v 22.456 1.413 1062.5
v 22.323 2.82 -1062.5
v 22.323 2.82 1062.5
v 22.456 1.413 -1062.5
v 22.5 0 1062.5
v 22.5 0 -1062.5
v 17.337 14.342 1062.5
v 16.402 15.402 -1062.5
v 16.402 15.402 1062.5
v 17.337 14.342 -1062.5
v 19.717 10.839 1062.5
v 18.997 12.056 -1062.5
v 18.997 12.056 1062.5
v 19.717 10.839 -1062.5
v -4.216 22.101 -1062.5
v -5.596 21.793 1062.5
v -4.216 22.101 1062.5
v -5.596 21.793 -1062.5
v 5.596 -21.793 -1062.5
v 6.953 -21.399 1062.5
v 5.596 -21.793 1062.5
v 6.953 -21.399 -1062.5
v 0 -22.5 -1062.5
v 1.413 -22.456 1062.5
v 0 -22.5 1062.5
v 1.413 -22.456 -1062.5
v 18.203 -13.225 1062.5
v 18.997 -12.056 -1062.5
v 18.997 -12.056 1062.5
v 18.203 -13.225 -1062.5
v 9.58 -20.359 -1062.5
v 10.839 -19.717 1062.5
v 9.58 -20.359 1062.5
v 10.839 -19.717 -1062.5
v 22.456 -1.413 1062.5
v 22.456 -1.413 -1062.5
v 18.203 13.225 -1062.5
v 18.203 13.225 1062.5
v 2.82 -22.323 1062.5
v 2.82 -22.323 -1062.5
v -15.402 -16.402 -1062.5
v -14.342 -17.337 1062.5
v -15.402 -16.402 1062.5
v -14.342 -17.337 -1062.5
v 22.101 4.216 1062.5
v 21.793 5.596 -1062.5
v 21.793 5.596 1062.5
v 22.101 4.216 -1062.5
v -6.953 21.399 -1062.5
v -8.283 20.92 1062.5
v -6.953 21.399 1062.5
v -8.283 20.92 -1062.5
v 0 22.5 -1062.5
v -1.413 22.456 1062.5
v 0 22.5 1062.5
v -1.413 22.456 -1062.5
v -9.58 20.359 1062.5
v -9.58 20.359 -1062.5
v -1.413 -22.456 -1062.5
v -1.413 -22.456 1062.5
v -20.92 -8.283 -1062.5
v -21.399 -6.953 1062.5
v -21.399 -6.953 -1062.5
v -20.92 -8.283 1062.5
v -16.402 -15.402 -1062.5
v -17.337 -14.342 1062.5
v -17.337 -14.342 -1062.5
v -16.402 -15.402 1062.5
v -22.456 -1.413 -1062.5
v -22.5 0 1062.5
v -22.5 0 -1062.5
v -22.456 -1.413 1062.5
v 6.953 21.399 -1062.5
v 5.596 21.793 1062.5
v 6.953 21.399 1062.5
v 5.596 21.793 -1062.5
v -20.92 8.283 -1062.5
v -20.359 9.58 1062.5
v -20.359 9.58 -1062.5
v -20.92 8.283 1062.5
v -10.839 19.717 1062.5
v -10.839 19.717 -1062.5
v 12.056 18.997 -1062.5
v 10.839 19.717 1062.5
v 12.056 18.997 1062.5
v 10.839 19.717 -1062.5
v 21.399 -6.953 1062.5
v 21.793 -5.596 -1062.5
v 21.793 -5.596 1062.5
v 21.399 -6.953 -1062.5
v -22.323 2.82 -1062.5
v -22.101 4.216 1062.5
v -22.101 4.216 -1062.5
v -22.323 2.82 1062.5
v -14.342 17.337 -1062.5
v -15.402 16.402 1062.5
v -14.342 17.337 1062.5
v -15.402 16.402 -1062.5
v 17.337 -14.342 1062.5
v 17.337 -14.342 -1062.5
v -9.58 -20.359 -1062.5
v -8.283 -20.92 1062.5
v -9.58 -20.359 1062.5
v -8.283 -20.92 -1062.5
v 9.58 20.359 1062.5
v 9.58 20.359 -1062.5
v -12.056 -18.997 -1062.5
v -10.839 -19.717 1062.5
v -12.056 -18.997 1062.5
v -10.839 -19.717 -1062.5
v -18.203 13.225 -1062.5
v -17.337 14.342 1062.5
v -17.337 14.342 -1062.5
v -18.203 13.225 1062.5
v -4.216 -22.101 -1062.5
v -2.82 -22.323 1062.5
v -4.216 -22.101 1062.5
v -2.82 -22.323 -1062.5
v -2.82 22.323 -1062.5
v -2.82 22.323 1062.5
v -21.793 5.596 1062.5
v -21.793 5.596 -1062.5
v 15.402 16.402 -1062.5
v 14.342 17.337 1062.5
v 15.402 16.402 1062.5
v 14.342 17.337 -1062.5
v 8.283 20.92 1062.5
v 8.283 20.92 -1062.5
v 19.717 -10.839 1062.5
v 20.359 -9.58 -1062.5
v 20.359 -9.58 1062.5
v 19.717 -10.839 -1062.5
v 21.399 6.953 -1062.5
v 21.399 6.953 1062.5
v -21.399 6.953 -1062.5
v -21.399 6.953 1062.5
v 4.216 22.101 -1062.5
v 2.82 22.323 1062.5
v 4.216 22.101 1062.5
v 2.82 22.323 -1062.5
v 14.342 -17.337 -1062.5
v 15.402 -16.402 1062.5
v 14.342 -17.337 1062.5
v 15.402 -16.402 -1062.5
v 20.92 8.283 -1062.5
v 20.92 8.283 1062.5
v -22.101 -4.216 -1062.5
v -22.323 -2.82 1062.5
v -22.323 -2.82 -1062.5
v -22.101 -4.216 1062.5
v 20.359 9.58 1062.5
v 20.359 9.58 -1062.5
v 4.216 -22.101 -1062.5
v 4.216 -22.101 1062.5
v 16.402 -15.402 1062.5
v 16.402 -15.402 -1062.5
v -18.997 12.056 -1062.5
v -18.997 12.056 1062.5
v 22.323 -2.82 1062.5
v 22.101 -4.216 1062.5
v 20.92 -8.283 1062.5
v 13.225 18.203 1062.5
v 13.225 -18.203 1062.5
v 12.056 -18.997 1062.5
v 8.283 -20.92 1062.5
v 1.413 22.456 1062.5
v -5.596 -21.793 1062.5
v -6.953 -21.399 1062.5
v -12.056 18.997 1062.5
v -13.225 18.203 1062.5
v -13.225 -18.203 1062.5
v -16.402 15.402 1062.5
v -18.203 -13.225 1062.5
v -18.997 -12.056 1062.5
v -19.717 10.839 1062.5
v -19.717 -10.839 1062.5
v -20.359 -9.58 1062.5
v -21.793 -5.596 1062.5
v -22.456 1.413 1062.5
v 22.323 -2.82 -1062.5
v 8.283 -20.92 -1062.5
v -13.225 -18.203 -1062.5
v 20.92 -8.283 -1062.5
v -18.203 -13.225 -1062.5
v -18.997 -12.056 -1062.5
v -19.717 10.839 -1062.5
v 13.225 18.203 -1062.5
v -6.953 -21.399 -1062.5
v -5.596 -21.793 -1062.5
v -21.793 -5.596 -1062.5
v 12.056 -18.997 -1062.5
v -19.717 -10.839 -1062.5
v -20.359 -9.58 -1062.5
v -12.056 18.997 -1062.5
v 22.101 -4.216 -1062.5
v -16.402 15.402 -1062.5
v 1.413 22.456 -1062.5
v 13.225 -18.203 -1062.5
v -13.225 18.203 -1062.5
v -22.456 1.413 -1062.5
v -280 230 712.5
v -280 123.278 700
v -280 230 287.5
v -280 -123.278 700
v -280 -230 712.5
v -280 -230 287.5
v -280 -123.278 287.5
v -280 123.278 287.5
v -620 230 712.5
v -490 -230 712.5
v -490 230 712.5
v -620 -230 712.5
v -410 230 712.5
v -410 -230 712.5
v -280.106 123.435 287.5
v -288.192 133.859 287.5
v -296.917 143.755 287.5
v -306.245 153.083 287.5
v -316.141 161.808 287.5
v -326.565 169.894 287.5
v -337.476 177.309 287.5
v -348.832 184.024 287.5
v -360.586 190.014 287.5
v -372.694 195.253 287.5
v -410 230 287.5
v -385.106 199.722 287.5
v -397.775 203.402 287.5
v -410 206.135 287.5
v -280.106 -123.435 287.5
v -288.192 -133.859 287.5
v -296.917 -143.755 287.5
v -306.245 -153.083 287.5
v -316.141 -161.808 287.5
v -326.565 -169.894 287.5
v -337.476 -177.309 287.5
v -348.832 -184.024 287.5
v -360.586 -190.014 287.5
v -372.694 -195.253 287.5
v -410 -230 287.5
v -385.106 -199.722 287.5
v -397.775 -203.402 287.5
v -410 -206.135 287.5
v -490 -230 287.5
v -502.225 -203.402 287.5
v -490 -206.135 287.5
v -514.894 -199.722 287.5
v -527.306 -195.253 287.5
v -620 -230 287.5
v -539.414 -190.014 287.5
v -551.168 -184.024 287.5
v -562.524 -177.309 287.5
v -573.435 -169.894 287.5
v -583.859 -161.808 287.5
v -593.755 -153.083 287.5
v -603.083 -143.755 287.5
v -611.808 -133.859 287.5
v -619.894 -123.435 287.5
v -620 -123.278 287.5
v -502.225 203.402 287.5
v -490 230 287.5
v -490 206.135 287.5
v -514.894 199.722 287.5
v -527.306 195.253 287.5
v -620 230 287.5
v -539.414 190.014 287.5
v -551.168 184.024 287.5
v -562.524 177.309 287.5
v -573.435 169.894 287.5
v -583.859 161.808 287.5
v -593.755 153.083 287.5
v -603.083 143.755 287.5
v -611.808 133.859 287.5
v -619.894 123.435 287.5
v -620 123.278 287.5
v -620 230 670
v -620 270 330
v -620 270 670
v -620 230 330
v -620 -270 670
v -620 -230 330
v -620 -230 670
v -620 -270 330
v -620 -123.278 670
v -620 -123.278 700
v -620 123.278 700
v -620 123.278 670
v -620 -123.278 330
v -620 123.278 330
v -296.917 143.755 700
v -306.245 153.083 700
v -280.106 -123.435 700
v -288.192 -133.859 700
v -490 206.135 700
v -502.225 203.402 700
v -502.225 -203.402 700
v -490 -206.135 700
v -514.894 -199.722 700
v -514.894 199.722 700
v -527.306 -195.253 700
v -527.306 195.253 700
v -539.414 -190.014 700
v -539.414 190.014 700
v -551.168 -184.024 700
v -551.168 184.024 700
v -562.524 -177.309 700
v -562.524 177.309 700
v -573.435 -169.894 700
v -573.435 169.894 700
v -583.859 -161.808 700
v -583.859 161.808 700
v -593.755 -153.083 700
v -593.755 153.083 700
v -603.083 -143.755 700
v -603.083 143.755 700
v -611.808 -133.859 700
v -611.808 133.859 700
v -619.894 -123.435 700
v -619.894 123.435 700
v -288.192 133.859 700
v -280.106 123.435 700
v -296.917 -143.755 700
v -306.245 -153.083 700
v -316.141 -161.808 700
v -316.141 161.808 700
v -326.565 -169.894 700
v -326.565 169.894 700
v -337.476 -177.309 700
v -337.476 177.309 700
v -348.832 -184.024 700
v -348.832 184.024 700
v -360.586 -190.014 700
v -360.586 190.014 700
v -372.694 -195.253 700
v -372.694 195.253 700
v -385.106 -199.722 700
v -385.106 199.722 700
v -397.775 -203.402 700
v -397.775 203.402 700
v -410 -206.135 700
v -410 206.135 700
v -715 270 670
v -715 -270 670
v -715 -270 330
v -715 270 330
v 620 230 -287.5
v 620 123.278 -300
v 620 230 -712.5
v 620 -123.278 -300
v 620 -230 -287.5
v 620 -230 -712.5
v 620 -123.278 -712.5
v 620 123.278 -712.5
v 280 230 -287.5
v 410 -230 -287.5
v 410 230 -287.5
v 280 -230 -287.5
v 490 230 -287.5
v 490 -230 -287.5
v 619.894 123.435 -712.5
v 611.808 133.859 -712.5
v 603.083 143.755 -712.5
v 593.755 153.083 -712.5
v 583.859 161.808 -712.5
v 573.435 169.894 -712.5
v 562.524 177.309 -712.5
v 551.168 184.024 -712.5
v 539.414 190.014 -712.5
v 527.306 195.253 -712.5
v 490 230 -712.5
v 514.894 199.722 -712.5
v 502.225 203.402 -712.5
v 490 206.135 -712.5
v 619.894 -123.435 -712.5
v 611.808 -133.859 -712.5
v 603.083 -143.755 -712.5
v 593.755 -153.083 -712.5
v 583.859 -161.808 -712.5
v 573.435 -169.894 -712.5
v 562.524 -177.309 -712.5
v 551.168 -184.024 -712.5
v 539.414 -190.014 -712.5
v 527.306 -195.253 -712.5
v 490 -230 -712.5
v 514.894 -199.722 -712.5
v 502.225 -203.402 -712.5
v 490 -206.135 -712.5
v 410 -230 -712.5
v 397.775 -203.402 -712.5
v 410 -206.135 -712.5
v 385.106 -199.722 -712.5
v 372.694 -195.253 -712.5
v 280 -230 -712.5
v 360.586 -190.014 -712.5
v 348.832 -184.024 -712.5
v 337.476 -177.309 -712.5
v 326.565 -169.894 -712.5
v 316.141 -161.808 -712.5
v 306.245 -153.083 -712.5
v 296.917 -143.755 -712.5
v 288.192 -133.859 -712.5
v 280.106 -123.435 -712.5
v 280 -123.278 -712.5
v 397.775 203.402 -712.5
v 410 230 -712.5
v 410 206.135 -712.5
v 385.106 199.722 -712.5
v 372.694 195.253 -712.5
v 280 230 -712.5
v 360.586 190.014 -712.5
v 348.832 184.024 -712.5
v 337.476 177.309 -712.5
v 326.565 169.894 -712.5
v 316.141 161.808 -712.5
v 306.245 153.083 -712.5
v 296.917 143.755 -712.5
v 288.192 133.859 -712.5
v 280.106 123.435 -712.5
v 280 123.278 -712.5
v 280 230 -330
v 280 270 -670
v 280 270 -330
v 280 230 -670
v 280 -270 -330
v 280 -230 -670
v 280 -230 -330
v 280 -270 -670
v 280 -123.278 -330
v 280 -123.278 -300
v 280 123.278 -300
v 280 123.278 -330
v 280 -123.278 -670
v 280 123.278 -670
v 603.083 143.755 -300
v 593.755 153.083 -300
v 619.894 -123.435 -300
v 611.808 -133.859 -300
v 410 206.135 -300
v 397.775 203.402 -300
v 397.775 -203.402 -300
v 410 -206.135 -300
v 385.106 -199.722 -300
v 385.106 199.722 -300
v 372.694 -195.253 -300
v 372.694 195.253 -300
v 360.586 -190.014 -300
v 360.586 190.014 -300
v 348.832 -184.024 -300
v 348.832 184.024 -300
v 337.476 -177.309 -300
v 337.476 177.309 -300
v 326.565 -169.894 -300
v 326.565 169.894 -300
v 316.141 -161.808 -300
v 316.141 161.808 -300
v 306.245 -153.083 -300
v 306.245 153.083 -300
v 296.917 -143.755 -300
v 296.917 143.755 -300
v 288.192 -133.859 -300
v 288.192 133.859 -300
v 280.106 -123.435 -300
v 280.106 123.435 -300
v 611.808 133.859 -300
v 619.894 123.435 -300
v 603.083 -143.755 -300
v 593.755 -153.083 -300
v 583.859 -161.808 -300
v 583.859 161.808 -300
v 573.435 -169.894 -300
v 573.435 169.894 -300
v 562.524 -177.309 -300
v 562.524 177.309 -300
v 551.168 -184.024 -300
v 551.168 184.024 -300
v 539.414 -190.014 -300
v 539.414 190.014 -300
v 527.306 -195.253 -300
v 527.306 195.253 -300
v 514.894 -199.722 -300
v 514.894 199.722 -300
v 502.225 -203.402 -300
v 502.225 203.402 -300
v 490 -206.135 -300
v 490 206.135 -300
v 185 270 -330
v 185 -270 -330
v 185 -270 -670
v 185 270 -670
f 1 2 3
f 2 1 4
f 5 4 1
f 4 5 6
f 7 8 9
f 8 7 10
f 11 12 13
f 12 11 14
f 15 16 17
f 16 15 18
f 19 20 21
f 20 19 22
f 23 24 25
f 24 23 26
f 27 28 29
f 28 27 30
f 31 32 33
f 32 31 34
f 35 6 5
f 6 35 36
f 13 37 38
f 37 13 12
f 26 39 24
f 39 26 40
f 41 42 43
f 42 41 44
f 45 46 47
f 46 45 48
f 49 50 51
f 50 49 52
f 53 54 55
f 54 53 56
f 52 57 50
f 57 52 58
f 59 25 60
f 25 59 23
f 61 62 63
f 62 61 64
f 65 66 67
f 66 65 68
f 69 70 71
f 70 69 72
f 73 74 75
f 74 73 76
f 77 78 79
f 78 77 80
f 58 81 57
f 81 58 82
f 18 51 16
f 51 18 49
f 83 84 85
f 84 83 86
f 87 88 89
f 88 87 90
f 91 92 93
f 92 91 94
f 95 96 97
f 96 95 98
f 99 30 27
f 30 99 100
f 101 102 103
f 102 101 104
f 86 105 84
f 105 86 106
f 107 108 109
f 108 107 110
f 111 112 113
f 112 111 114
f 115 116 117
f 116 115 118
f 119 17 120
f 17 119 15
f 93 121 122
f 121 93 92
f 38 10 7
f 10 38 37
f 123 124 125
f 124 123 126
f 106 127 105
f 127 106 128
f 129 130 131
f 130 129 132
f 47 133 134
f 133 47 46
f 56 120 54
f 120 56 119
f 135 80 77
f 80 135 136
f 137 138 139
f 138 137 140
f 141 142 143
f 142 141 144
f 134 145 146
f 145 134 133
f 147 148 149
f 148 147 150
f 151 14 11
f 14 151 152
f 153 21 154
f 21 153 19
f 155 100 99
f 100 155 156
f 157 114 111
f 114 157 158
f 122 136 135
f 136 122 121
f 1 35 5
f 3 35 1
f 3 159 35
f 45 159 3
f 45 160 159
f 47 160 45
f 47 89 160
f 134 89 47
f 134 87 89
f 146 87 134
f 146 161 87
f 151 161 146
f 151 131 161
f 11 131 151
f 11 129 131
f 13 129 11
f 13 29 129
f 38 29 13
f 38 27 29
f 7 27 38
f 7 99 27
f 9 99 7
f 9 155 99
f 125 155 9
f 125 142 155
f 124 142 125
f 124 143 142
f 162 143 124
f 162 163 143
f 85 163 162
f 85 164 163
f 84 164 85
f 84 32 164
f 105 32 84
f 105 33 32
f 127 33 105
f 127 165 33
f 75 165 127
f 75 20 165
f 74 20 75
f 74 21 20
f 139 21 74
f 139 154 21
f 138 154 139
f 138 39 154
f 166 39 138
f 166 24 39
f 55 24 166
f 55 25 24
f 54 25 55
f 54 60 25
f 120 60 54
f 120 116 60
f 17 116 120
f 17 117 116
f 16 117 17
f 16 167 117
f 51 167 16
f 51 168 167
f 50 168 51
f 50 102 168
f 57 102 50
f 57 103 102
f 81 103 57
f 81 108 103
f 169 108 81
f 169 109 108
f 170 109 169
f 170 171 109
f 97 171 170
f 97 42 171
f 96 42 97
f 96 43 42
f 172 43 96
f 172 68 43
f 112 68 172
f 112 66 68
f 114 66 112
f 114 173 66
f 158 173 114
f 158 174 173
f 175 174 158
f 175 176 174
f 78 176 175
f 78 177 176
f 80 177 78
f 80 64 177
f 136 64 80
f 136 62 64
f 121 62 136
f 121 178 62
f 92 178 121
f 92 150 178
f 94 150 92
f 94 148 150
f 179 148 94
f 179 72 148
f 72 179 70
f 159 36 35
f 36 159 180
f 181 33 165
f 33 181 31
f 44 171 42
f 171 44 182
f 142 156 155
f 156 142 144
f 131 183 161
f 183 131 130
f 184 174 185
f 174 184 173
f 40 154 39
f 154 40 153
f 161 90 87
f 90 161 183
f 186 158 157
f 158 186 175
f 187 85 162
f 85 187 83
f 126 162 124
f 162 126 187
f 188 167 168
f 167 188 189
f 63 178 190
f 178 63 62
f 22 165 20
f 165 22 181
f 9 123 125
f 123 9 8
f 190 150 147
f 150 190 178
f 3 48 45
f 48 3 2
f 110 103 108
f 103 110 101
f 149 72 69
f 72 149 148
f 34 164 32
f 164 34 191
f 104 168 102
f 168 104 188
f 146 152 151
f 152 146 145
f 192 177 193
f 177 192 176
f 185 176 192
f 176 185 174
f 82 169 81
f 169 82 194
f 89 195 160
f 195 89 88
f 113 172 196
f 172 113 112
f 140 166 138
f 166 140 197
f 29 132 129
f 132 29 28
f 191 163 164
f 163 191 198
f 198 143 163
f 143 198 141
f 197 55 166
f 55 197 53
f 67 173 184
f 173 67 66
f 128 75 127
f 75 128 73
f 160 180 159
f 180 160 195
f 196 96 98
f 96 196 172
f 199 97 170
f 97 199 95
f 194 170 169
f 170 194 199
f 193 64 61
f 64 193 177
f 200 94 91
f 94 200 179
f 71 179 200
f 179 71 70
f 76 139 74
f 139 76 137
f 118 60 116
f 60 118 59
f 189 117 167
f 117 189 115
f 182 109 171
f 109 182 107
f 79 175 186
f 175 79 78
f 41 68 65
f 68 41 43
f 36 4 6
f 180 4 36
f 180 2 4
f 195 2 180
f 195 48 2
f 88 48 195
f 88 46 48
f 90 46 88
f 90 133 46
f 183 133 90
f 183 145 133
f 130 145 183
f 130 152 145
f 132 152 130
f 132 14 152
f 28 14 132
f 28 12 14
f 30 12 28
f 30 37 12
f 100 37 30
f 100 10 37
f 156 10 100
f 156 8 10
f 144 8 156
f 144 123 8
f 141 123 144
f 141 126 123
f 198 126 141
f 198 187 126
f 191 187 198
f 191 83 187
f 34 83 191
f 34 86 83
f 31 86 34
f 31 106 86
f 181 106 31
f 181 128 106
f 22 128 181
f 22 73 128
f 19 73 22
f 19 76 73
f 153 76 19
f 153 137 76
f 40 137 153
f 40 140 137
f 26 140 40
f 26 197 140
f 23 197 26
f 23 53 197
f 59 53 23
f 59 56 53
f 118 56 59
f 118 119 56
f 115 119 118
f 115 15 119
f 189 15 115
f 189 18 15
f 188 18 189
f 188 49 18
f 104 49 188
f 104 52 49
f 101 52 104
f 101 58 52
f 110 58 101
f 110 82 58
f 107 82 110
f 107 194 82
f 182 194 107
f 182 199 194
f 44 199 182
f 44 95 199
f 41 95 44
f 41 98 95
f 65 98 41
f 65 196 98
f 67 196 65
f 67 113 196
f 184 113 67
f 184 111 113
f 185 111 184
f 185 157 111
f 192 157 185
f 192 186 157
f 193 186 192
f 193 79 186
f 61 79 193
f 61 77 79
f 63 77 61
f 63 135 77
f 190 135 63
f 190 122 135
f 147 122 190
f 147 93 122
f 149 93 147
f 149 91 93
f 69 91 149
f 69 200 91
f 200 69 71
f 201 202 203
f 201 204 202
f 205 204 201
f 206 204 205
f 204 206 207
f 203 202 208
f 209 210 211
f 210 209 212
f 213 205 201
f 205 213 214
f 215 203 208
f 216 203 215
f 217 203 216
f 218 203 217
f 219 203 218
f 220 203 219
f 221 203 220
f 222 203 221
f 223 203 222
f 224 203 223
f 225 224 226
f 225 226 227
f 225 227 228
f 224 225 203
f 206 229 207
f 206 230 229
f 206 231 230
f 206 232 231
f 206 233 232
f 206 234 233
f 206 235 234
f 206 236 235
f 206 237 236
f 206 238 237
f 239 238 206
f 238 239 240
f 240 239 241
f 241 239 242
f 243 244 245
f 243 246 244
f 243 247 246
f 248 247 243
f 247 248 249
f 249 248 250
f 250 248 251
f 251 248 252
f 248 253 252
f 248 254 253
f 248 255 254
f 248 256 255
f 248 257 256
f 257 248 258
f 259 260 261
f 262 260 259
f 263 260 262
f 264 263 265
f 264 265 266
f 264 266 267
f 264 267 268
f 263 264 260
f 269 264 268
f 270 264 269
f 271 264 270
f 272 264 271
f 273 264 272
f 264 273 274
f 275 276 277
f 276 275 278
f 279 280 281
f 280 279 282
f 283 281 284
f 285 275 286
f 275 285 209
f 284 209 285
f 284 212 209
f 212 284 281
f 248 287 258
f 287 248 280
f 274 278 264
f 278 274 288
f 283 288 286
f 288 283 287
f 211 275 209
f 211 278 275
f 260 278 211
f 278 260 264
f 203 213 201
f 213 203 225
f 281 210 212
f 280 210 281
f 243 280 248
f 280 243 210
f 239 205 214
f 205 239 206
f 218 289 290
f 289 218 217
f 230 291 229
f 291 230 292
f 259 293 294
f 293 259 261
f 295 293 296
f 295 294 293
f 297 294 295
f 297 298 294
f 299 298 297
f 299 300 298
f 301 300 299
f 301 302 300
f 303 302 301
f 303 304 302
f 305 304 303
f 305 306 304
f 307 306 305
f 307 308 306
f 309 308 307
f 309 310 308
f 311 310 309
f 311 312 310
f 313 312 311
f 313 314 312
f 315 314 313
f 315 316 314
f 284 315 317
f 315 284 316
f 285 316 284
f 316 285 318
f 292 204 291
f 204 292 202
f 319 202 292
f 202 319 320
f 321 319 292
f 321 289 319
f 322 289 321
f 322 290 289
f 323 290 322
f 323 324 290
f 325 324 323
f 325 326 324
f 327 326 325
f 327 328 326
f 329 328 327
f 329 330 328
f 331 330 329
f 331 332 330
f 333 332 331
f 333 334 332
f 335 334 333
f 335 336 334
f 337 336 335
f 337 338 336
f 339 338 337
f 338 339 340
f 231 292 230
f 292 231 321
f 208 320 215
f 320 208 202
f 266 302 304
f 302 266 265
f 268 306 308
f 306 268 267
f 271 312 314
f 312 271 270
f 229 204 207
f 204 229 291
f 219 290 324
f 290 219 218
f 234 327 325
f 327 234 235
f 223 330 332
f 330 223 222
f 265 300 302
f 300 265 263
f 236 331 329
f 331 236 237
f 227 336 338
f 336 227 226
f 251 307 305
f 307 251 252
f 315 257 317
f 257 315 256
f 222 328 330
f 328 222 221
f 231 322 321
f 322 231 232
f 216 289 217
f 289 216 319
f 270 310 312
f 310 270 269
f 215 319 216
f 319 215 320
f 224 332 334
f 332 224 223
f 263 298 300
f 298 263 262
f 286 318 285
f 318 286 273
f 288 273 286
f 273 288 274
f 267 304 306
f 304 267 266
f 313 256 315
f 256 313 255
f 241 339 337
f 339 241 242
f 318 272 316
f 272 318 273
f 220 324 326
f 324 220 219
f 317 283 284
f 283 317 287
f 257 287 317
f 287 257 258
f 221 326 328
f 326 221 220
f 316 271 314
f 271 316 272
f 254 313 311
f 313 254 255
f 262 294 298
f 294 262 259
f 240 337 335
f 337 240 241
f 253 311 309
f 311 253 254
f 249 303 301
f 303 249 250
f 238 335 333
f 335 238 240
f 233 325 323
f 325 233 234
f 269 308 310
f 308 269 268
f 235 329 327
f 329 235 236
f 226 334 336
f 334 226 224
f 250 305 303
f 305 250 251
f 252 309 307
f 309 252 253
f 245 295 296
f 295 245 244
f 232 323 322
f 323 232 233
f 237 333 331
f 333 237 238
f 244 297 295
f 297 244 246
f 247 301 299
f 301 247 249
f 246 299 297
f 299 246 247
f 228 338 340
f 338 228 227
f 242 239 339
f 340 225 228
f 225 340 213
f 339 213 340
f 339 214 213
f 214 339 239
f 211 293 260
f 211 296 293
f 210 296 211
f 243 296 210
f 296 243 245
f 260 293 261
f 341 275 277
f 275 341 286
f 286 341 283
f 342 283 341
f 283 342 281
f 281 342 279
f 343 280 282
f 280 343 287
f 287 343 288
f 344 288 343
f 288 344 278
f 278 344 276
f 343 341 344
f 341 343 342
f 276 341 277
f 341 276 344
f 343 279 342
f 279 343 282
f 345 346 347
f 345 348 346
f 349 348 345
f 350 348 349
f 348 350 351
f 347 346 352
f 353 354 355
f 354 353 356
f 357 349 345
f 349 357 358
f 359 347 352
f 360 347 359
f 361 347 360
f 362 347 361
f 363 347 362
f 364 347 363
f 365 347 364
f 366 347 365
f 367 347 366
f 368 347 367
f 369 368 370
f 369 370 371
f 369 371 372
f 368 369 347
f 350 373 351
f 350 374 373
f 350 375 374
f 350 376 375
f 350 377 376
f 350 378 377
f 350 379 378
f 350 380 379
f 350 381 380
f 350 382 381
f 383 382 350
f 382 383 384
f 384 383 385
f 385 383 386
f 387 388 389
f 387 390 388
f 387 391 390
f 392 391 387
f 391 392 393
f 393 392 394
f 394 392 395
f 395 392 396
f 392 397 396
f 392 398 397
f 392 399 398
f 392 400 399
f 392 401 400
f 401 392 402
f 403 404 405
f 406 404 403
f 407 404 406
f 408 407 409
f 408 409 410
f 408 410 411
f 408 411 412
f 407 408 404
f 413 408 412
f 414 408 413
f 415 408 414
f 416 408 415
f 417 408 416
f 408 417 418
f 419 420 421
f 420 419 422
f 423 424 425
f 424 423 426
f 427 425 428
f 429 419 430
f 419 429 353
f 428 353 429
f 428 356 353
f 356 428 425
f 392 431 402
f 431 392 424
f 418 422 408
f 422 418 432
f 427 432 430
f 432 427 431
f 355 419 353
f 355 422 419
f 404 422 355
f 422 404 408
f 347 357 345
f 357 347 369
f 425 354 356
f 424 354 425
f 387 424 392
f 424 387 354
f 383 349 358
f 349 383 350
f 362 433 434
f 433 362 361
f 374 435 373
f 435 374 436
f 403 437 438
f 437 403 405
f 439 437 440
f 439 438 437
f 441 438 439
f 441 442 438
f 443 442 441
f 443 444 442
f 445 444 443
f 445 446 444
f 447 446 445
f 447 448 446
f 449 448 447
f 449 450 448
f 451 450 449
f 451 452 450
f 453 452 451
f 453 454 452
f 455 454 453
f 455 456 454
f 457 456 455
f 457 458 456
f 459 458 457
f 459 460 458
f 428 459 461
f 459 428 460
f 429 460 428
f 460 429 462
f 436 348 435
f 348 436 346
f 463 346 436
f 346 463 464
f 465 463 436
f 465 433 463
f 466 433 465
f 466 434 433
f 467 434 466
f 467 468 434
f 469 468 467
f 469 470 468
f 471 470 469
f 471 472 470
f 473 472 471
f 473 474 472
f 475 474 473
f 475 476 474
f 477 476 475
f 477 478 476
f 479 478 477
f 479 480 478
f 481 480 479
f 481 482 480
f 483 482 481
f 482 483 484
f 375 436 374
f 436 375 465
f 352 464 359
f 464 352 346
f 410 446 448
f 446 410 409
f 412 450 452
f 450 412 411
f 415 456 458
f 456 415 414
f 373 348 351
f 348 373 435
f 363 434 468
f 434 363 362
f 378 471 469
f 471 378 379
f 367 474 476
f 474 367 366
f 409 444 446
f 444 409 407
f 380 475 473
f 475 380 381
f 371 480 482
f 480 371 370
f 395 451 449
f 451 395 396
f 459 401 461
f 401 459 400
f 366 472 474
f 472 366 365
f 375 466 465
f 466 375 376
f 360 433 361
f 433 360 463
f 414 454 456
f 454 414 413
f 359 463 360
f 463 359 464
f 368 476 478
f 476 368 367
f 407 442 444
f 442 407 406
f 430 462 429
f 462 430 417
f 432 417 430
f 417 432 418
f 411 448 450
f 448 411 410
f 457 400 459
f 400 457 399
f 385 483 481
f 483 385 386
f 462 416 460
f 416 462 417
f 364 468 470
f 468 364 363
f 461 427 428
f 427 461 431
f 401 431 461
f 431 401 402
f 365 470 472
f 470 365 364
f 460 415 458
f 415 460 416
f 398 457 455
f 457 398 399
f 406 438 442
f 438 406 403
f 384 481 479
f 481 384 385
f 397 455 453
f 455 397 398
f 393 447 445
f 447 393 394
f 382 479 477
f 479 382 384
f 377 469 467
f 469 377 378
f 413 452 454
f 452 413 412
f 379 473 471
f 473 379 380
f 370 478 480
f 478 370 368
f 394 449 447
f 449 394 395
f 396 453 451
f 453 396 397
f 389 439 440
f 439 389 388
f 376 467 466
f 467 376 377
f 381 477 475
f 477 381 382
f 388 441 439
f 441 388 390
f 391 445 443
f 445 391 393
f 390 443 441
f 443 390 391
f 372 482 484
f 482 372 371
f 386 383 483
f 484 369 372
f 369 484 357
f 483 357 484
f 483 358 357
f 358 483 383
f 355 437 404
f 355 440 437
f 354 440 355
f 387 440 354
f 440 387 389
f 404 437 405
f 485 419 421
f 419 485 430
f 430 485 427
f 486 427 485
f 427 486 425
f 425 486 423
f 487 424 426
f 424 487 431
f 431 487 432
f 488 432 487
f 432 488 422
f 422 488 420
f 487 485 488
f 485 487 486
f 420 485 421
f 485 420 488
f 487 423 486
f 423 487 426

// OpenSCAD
// ============================================================================
// PROJECT: XXXG-00W0 WING GUNDAM ZERO EW - AIRFRAME STRUCTURAL CORE
// COMPONENT VAULT: BANDAI CAST RUNNER G - SHOULDER LINKAGES G4 & G5
// MANUAL EXTENSION: GUNDAM 00 MECHANICS 1ST SPECIAL BRACKET INTEGRATION
// CONFIG METRIC: SCALED DIECAST METAL EXTENSION (1:1 ACTUAL METRIC UP-SCALE)
// ============================================================================

$fn = 100; // High-precision rendering resolution count

// Sizing Constants Scaled 1:1 for a 16.7-Meter Airframe Scale (mm)
shoulder_link_height = 850;             // Total longitudinal axis height (mm)
pivot_bore_diameter = 420;              // Internal rotational joint bearing path (mm)
titanium_frame_wall = 65;               // Solid TiAl structural core wall (mm)
harness_conduit_width = 80;             // Cast-in 4oz copper logic trace track (mm)
support_bracket_thickness = 95;         // Heavy external 00-Mechanics reinforcement (mm)

module Runner_G_Shoulder_Forge() {
    // Central Supply Injection Runner Axis (Molten Feed Line from Siphon Forge)
    color([0.2, 0.2, 0.22]) {
        cylinder(h = shoulder_link_height * 2.5, d = 45, center = true);
        // Direct injection gates tracking straight into the part mold cavities
        translate() rotate() cylinder(h = 500, d = 22);
        translate([0, 0, -500]) rotate() cylinder(h = 500, d = 22);
    }
    
    // Instantiate Scaled Skeutomorphic Part Molds Symmetrically
    Cast_Internal_Shoulder_Linkages();
}

module Cast_Internal_Shoulder_Linkages() {
    // ---- PART G4: INTERNAL LEFT SHOULDER LINKAGE & 00 SUPPORT BRACE ---- [Page 4, Step 05-1]
    translate([-450, 0, 500]) color([0.35, 0.35, 0.38]) { // Inner Frame Gunmetal Spec
        difference() {
            // Heavy-duty structural yoke block mounting to the chest cowl
            cube([340, 460, shoulder_link_height * 0.5], center = true);
            
            // Concentric Internal Boring for the Forward Extension Bearing Track
            translate([0, 0, -50])
                rotate()
                    cylinder(h = 500, d = pivot_bore_diameter, center = true);
            
            // Continuous cast-in routing track for the 4oz solid-state wiring rails
            cube([harness_conduit_width, 500, shoulder_link_height], center = true);
        }
        
        // GUNDAM 00 MECHANICS HEAVY BRACKET EXTENSION [External Load Bridge]
        color([0.5, 0.5, 0.52]) { // High-strength diecast metal reinforcement
            translate([-(340/2 + support_bracket_thickness/2), 0, 0])
                cube([support_bracket_thickness, 540, shoulder_link_height * 0.4], center = true);
        }
    }
    
    // ---- PART G5: INTERNAL RIGHT SHOULDER LINKAGE & 00 SUPPORT BRACE ---- [Page 4, Step 05-1]
    translate([450, 0, -500]) rotate() color([0.35, 0.35, 0.38]) {
        difference() {
            cube([340, 460, shoulder_link_height * 0.5], center = true);
            translate([0, 0, -50])
                rotate()
                    cylinder(h = 500, d = pivot_bore_diameter, center = true);
            cube([harness_conduit_width, 500, shoulder_link_height], center = true);
        }
        
        color([0.5, 0.5, 0.52]) {
            translate([-(340/2 + support_bracket_thickness/2), 0, 0])
                cube([support_bracket_thickness, 540, shoulder_link_height * 0.4], center = true);
        }
    }
}

// Render Master Assembly to Parameter Workspace
Runner_G_Shoulder_Forge();
